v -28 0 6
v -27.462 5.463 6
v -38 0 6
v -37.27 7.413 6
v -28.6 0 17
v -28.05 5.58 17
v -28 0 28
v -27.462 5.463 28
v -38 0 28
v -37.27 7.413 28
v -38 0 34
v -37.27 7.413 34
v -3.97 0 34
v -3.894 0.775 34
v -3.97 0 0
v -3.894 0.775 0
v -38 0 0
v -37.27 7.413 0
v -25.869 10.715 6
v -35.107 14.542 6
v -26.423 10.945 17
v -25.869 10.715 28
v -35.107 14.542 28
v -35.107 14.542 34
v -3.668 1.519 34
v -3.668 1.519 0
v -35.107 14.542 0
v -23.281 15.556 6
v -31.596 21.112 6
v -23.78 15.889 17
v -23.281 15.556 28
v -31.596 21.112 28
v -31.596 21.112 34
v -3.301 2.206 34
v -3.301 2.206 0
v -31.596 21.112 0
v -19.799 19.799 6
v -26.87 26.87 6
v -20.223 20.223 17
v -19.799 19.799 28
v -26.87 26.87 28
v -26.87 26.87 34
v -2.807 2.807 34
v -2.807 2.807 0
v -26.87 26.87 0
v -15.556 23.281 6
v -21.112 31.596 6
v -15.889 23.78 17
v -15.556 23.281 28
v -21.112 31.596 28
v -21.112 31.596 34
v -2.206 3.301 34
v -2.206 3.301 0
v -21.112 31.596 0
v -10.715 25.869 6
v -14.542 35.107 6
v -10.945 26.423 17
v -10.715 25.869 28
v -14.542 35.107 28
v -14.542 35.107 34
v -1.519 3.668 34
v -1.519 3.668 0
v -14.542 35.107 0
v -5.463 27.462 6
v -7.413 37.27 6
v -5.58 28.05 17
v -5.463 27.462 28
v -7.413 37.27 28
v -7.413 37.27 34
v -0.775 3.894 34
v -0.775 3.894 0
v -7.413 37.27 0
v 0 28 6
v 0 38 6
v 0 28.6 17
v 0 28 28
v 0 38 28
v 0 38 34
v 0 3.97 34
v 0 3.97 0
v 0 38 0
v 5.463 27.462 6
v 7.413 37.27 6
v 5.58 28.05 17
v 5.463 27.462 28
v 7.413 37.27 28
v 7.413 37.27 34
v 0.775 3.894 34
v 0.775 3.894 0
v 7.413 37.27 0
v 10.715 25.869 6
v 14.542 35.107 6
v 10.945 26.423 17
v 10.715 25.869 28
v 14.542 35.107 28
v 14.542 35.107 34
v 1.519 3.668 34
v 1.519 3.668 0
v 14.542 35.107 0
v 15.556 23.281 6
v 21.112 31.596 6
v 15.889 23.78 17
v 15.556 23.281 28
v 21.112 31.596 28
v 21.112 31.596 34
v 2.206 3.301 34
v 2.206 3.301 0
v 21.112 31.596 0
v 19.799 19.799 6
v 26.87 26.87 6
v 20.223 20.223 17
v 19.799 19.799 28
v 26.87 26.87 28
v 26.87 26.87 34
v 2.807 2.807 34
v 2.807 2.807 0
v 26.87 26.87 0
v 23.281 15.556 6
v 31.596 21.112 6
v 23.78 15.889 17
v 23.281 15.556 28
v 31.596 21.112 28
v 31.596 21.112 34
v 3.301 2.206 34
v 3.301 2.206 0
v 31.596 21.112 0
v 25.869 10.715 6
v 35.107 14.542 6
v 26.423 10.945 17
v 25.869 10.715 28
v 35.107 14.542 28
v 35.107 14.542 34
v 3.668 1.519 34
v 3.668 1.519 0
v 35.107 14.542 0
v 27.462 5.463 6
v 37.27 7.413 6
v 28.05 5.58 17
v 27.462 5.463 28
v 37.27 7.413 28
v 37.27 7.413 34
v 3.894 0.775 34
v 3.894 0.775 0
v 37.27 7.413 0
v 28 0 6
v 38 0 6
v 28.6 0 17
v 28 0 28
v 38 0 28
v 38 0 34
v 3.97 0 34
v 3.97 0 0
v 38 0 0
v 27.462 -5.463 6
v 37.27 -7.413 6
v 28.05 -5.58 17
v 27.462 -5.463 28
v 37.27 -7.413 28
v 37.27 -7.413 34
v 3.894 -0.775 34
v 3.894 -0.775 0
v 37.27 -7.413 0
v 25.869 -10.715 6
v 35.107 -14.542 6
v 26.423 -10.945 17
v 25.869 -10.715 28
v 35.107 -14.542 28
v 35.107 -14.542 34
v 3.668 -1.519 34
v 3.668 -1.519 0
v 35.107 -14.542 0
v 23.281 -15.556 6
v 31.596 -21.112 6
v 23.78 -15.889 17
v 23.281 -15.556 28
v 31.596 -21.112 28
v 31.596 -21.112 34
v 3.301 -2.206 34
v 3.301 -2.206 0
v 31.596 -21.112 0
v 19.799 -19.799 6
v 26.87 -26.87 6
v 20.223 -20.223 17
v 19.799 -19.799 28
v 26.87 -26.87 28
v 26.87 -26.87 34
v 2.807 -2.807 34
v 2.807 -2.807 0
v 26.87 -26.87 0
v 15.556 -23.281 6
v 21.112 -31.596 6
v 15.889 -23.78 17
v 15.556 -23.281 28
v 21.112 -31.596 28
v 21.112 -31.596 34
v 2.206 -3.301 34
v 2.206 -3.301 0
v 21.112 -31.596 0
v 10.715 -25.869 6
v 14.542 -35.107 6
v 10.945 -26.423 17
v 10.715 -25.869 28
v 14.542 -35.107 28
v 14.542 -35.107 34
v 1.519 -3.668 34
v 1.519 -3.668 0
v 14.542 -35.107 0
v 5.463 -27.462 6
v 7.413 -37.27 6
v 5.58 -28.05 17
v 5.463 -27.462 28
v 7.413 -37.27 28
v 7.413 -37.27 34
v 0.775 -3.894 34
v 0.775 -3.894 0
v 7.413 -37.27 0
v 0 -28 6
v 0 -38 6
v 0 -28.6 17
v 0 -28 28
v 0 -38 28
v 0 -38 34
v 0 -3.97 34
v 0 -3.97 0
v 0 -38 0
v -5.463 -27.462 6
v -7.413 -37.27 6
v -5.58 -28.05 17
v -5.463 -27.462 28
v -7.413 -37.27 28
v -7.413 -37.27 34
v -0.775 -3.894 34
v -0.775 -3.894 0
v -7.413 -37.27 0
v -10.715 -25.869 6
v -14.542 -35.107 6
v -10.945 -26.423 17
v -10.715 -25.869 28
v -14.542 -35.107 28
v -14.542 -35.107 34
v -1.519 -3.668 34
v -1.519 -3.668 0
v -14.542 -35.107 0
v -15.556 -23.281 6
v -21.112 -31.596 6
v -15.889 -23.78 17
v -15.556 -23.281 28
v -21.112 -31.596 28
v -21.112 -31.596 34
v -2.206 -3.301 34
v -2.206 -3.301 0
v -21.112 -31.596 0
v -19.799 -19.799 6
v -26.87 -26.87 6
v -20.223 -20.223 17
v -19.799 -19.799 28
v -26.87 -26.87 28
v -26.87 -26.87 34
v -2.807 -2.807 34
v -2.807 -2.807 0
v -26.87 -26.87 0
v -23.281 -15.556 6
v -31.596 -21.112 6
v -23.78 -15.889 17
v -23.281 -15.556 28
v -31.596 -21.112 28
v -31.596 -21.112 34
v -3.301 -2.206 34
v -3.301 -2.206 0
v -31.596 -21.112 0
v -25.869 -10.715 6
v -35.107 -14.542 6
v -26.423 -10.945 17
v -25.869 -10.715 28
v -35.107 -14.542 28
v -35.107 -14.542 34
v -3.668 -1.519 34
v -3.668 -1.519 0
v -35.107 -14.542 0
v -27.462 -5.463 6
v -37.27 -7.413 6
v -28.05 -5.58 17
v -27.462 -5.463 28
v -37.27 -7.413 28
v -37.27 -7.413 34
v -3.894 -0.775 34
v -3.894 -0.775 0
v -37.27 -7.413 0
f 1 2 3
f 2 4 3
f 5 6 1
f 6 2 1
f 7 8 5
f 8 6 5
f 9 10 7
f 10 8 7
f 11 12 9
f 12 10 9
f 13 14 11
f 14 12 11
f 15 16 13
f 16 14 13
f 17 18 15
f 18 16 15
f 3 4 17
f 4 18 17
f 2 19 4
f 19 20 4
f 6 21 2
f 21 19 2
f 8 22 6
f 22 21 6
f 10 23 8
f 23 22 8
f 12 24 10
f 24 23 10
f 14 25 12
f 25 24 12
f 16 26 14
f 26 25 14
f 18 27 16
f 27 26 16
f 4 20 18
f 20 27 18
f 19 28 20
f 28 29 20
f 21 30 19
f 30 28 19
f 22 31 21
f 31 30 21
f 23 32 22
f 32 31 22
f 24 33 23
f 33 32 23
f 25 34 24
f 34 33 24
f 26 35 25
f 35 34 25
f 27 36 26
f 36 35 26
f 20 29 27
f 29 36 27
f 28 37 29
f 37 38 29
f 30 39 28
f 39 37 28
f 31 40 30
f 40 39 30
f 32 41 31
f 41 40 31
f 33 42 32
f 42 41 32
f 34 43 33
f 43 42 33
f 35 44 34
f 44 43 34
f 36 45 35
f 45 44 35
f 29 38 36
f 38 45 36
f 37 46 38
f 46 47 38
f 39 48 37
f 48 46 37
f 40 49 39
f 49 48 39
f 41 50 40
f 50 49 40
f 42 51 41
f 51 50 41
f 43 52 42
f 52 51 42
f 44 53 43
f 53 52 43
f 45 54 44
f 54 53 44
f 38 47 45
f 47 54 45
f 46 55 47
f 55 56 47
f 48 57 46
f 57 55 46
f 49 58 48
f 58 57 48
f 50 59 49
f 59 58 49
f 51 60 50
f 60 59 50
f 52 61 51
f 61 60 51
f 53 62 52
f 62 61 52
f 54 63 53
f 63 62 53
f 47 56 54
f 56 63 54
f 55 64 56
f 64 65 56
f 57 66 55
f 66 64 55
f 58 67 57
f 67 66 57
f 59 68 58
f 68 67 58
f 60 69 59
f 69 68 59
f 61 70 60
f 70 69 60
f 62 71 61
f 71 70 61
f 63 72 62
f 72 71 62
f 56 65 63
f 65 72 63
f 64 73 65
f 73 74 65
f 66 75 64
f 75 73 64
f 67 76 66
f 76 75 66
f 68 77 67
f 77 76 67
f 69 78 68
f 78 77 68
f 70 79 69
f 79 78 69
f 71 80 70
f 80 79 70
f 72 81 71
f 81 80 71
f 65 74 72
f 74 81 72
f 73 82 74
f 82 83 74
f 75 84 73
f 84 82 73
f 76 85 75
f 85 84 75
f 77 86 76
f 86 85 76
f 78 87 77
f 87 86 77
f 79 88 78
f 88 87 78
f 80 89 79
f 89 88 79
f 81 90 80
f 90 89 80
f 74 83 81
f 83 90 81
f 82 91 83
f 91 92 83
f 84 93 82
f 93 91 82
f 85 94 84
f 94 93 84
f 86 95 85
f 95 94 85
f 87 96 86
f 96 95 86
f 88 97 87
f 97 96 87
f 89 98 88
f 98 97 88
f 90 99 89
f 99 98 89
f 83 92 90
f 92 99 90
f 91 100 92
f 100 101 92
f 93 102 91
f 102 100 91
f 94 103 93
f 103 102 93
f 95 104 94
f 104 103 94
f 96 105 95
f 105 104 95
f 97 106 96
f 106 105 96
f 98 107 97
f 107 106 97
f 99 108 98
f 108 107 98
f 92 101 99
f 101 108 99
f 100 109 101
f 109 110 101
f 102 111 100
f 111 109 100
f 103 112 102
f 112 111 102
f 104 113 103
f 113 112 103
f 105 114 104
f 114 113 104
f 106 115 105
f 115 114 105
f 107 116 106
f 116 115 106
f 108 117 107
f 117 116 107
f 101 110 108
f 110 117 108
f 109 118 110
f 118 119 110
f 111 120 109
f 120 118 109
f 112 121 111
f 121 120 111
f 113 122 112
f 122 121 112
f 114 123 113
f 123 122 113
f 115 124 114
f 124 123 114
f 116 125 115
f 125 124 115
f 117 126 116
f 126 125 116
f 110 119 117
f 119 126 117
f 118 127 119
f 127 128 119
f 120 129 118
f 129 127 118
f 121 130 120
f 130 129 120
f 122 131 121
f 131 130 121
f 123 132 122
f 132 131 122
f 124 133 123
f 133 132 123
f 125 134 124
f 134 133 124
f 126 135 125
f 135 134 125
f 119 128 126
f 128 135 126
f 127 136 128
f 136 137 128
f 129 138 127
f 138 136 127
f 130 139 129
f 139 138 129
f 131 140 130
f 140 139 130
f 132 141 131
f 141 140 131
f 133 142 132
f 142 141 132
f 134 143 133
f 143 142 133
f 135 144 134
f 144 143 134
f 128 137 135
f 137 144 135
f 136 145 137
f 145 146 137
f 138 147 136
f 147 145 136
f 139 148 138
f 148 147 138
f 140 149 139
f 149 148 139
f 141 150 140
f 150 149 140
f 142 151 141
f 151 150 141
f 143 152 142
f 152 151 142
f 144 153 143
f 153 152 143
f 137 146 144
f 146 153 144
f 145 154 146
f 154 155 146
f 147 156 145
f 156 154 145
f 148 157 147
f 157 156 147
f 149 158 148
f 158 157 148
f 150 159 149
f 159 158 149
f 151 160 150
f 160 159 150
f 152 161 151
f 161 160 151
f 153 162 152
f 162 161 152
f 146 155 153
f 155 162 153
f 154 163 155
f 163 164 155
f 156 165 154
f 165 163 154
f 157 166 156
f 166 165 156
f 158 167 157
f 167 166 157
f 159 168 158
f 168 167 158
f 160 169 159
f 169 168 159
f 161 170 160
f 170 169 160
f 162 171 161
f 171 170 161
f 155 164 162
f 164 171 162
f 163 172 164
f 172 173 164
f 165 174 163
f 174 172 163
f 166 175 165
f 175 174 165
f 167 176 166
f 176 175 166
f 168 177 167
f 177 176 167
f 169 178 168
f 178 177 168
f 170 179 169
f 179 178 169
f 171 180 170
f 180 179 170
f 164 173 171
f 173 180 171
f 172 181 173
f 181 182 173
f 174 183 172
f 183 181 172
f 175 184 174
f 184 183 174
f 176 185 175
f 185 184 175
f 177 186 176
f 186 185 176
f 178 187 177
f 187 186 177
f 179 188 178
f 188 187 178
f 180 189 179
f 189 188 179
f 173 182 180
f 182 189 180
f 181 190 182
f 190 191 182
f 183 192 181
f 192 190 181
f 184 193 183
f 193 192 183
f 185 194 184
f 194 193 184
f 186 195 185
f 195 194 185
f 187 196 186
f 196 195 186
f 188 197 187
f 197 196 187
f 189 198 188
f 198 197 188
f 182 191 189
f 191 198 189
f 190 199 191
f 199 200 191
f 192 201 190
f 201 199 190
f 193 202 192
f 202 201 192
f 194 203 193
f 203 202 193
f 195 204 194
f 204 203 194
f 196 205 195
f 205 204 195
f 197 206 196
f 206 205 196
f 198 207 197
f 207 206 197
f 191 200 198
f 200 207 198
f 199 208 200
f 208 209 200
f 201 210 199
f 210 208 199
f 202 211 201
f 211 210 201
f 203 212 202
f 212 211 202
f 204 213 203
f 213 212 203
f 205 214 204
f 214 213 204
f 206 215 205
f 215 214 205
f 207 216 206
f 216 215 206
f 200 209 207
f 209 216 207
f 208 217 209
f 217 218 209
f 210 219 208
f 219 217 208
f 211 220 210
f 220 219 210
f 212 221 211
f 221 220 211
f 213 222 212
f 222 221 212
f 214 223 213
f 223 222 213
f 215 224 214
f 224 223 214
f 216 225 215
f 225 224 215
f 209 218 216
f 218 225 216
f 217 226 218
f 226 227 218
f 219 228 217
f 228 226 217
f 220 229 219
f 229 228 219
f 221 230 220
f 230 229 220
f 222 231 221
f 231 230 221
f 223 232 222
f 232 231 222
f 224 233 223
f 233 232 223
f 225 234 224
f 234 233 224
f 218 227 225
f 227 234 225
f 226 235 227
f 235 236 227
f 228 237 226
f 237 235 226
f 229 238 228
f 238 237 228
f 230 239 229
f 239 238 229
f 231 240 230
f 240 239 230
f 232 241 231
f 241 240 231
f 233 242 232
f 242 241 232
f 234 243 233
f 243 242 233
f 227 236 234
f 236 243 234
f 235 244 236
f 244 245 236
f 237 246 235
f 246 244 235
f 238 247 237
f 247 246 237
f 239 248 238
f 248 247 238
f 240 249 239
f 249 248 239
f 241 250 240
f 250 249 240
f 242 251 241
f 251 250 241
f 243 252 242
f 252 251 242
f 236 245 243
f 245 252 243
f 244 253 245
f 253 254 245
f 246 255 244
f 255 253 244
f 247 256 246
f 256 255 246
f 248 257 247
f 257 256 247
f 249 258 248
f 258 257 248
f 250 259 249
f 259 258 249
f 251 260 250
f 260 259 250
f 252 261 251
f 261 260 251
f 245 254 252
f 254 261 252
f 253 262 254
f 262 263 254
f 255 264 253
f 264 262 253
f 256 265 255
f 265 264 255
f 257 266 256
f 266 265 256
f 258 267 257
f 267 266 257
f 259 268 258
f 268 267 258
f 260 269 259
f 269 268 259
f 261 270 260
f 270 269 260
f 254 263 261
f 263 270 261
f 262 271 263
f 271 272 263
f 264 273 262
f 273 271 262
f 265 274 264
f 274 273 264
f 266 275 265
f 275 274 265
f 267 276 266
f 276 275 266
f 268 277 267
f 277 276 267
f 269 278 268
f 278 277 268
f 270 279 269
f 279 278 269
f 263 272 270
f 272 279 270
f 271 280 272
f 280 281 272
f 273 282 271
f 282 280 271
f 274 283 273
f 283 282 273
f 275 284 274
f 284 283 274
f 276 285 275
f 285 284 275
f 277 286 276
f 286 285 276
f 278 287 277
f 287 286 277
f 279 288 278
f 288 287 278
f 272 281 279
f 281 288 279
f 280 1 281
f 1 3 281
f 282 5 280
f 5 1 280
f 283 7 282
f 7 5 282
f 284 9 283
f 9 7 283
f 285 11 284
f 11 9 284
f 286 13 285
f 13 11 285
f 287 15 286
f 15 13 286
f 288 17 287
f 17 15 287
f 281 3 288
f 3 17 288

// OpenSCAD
$fn = 32;

// ----------------------------------------------------------------------
// Belt roller: 56 mm barrel, 34 mm wide, bore 7.94 mm
// ----------------------------------------------------------------------

// --- parameters (mm) ---
bore_d = 7.94;            // bore
barrel_d = 56;            // barrel diameter
roller_w = 34;            // roller width
flange_d = 76;            // flange diameter
flange_t = 6;             // flange thickness
hub_d = 31.94;            // hub diameter

roller_profile = [[3.97, 0], [38, 0], [38, 6], [28, 6], [28.6, 17], [28, 28], [38, 28], [38, 34], [3.97, 34]];

/* the profile stays clear of the axis, so the bore comes out of the revolve */
rotate_extrude() polygon(roller_profile);
